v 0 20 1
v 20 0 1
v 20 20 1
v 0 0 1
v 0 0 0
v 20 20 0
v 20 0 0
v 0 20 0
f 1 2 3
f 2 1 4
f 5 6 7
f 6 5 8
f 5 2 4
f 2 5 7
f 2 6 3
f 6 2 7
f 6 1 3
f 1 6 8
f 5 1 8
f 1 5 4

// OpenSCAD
// file: ../OpenSCAD/HourOfCode.scad
tileHeight = 5;

module tile(x, y) {

    difference() {
        difference() {
            difference(){
                difference() {
                    translate([x, y, 0])
                        cube([20,20,tileHeight]);

                translate([x , y , tileHeight-3])
                    rotate([45,0,0])
                        cube([20, 4, 4]);
                } 
            translate([x , y + 20, tileHeight-3])
                rotate([45,0,0])
                    cube([20, 4, 4]);
            }

        translate([x , y , tileHeight-3])
            rotate([45,0,90])
               cube([20, 4, 4]);
        }
        translate([x + 20, y + 0, tileHeight-3])
            rotate([45,0,90])
               cube([20, 4, 4]);
    }

}



module cog(x, y) {
    translate([x, y, 0]) {
        cube([20, 20, 1]);
        translate([10, 10, 1]) {
            scale([0.25, 0.25, 0.25]) {
                surface(file = "../OpenSCAD/HourOfCodeCog.png", center = true, convexity = 5);
            }
        }
    }
}

module cross(x, y) {
    translate([x, y, 0]) {
        cube([20, 20, 1]);
            translate([10, 10, 15]) {
            rotate([0, 0, 0]) {
                scale([0.18, 0.18, 0.15]) {
                    surface(file = "../OpenSCAD/HourOfCodeCross.png", invert = true, center = true, convexity = 5);
                }
            }
        }
    }
}

module boxes(x, y) {
    translate([x, y, 0]) {
        cube([20, 20, 1]);
        translate([6, 1, 0])
            rotate([0, 0, 45])
                cube([7, 7, 7]);
        translate([8, 11, 0])
            rotate([0, 0, 10])
                cube([7, 7, 7]);
        translate([14, 3, 0])
            rotate([0, 0, 40])
                cube([7, 7, 7]);
        translate([8, 6, 7])
            rotate([0, 0, 0])
                cube([7, 7, 7]);
    }
}

module boardTest() {
    difference() {
        cube([50, 50, 10]);
        translate([5, 5, 5])
            cube([40, 40, 6]);
    }
    translate([5, 5, 3])
        for (tx =[0:20:30]) 
            for (ty =[0:20:30]) {
                tile(tx,ty);
            }
}

module board() {
    difference() {
        cube([170, 170, 10]);
        translate([5, 5, 5])
            cube([160, 160, 6]);
    }
    translate([5, 5, 3])
        for (tx =[0:20:150]) 
            for (ty =[0:20:150]) {
                tile(tx,ty);
            }
}

module topPiece(x, y) {
    translate([x + 20, y, 8]) {
    rotate([0, 180, 0]) {
        difference() {
            translate([0, 0, 2]) 
                cube([20, 20, 6]);
            tile(0, 0);
        }
    }
}
}

/*
for (tx =[0:22:60]) {
    topPiece(tx, 0);
}
*/



/*
translate([0, 0, 0])
    color("Blue", 0.5)
        cog(0, 0);
//translate([0, 20, 0])
//    rotate([180, 0, 0])
//        topPiece(0, 0);


translate([0, -25, 0])
    color("Red", 0.5)
        cross(0, 0);
//translate([0, -5, 0])
//    rotate([180, 0, 0])
//        topPiece(0, 0);
*/


//tile(0, 0);
//board();
//boardTest();
//topPiece(0,0);
//cog(0, 0);
//cross(0, 0);



  
// main file
include <../OpenSCAD/HourOfCode.scad>;

/*
// ------------------------------------------------------------- //
// ------------------------------------------------------------- //
//                        T O    U S E  ;                        //
// 1. Create a file and add the following line at the top;       //
include <../OpenSCAD/HourOfCode.scad>; // already done in this file
// 2. Use one of the following templates;                        
//tile(x, y);   // build a tile, which a top piece can fit on
//board();      // build an 8 x 8 board of tiles
//boardTest();  // build a 2 x 2 board of tiles
//topPiece(x,0);// build a top piece, which will fit on top of the board
//cog(x, y);    // build a cog, to fit on top of a top piece (scrap metal)
//cross(x, y);  // build a cross, to fit on top of a top piece (bandit)
//boxes(x, y)   // build a pile of boxes, to fit on top of a top piece (obstacle)
// where x and y are the coordinates used to place the model (0, 0 works well)
*/
// ------------------------------------------------------------- //
// ------------------------------------------------------------- //

cross(0, 0);
